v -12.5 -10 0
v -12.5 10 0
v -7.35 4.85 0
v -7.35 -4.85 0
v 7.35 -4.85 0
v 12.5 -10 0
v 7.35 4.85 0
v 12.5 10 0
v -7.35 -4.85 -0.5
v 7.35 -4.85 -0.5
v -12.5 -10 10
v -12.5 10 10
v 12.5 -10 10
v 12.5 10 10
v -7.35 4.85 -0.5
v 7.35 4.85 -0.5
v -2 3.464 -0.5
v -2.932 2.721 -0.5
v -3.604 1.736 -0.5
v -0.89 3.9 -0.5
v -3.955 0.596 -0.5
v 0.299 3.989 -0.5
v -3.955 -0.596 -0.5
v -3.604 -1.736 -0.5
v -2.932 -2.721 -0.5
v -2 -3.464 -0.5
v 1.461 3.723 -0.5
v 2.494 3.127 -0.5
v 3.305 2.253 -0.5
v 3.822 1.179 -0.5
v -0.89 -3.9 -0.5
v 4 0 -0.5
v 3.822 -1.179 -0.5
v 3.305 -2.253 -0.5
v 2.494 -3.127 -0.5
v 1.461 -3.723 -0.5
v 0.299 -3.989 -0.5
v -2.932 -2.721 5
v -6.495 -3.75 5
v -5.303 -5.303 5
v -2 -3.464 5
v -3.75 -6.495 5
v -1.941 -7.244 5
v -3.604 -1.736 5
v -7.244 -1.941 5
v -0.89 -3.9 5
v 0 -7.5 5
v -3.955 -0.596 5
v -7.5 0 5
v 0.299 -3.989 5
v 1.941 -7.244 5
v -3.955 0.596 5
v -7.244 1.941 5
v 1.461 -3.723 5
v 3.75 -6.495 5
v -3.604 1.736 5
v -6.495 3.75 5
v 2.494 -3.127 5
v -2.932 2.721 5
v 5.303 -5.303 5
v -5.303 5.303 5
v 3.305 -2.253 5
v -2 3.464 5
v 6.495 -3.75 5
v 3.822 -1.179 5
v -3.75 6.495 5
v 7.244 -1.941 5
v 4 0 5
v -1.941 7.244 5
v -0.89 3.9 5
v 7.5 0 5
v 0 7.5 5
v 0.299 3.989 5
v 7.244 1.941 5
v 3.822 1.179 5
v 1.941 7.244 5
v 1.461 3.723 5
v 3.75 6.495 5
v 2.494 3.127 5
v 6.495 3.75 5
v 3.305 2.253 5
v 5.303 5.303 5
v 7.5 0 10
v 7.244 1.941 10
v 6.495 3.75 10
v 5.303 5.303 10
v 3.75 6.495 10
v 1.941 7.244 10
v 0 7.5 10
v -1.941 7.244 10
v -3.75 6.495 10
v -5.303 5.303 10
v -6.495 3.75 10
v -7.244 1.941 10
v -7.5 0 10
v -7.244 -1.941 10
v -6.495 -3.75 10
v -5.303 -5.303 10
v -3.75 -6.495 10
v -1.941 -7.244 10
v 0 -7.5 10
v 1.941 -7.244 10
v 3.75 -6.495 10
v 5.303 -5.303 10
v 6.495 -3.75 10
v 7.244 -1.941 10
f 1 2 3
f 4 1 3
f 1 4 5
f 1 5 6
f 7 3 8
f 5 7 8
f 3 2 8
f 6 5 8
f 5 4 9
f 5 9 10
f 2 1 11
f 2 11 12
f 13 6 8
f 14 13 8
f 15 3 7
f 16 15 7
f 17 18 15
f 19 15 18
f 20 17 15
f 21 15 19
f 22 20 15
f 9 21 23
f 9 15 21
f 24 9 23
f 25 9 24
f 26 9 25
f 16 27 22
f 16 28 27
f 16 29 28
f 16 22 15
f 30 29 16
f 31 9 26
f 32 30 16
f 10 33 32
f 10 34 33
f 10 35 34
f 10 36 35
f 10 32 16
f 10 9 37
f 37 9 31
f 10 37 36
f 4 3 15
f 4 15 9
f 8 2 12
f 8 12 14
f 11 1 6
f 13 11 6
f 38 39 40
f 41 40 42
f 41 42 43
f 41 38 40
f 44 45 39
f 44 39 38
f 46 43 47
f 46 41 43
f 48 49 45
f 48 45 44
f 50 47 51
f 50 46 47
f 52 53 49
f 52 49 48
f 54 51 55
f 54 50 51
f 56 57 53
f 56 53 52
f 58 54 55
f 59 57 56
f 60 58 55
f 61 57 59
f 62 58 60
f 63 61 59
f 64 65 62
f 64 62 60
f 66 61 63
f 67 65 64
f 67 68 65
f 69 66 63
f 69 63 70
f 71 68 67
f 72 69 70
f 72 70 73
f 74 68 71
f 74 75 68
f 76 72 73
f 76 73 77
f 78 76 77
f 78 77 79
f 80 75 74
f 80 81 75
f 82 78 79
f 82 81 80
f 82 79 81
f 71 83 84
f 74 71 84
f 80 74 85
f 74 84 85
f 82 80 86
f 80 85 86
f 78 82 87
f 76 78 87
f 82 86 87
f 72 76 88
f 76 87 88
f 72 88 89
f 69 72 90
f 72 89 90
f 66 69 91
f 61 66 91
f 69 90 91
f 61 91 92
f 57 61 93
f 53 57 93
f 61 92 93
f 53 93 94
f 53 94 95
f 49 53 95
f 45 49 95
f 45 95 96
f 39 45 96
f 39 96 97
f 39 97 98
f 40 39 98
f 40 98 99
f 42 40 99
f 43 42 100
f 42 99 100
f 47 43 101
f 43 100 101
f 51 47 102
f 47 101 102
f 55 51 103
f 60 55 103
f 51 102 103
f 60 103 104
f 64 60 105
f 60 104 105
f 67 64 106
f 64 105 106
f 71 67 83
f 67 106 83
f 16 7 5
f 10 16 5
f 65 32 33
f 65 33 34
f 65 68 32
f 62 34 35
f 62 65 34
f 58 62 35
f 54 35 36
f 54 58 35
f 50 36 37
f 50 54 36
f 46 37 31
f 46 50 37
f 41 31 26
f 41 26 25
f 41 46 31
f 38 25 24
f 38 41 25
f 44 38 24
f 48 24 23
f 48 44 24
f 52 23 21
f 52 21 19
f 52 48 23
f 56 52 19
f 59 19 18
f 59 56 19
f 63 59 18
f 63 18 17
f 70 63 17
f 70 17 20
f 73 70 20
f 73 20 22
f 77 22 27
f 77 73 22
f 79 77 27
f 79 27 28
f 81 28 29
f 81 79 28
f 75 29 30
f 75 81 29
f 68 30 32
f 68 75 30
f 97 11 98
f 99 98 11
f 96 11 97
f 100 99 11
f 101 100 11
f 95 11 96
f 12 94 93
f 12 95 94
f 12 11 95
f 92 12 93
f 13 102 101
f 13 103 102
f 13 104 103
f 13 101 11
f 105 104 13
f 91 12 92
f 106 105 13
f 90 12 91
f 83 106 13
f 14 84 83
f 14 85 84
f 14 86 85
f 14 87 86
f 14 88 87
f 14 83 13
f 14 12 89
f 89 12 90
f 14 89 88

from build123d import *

# Parameters (mm, degrees)
F0_W     = 25
F0_H     = 20
F0_R     = 4
F1_DEPTH = 10
F2_R     = 7.5
F3_DEPTH = 5
F4_W     = 14.7
F4_H     = 9.7
F4_R     = 4
F5_DEPTH = 0.5


with BuildPart() as f1:
    # F0 (on Top) → F1 (new body)
    with BuildSketch(Plane.XY):
        Rectangle(F0_W, F0_H)
        Circle(F0_R, mode=Mode.SUBTRACT)
    extrude(amount=F1_DEPTH)

    # F2 (on face) → F3 (cut)
    with BuildSketch(Plane.XY.offset(10)):
        Circle(F2_R)
    extrude(amount=-F3_DEPTH, mode=Mode.SUBTRACT)

    # F4 (on face) → F5 (join)
    with BuildSketch(Plane(origin=(0, 0, 0), x_dir=(1, 0, 0), z_dir=(0, 0, -1))):
        Rectangle(F4_W, F4_H)
        Circle(F4_R, mode=Mode.SUBTRACT)
    extrude(amount=F5_DEPTH)


solid = f1.part
